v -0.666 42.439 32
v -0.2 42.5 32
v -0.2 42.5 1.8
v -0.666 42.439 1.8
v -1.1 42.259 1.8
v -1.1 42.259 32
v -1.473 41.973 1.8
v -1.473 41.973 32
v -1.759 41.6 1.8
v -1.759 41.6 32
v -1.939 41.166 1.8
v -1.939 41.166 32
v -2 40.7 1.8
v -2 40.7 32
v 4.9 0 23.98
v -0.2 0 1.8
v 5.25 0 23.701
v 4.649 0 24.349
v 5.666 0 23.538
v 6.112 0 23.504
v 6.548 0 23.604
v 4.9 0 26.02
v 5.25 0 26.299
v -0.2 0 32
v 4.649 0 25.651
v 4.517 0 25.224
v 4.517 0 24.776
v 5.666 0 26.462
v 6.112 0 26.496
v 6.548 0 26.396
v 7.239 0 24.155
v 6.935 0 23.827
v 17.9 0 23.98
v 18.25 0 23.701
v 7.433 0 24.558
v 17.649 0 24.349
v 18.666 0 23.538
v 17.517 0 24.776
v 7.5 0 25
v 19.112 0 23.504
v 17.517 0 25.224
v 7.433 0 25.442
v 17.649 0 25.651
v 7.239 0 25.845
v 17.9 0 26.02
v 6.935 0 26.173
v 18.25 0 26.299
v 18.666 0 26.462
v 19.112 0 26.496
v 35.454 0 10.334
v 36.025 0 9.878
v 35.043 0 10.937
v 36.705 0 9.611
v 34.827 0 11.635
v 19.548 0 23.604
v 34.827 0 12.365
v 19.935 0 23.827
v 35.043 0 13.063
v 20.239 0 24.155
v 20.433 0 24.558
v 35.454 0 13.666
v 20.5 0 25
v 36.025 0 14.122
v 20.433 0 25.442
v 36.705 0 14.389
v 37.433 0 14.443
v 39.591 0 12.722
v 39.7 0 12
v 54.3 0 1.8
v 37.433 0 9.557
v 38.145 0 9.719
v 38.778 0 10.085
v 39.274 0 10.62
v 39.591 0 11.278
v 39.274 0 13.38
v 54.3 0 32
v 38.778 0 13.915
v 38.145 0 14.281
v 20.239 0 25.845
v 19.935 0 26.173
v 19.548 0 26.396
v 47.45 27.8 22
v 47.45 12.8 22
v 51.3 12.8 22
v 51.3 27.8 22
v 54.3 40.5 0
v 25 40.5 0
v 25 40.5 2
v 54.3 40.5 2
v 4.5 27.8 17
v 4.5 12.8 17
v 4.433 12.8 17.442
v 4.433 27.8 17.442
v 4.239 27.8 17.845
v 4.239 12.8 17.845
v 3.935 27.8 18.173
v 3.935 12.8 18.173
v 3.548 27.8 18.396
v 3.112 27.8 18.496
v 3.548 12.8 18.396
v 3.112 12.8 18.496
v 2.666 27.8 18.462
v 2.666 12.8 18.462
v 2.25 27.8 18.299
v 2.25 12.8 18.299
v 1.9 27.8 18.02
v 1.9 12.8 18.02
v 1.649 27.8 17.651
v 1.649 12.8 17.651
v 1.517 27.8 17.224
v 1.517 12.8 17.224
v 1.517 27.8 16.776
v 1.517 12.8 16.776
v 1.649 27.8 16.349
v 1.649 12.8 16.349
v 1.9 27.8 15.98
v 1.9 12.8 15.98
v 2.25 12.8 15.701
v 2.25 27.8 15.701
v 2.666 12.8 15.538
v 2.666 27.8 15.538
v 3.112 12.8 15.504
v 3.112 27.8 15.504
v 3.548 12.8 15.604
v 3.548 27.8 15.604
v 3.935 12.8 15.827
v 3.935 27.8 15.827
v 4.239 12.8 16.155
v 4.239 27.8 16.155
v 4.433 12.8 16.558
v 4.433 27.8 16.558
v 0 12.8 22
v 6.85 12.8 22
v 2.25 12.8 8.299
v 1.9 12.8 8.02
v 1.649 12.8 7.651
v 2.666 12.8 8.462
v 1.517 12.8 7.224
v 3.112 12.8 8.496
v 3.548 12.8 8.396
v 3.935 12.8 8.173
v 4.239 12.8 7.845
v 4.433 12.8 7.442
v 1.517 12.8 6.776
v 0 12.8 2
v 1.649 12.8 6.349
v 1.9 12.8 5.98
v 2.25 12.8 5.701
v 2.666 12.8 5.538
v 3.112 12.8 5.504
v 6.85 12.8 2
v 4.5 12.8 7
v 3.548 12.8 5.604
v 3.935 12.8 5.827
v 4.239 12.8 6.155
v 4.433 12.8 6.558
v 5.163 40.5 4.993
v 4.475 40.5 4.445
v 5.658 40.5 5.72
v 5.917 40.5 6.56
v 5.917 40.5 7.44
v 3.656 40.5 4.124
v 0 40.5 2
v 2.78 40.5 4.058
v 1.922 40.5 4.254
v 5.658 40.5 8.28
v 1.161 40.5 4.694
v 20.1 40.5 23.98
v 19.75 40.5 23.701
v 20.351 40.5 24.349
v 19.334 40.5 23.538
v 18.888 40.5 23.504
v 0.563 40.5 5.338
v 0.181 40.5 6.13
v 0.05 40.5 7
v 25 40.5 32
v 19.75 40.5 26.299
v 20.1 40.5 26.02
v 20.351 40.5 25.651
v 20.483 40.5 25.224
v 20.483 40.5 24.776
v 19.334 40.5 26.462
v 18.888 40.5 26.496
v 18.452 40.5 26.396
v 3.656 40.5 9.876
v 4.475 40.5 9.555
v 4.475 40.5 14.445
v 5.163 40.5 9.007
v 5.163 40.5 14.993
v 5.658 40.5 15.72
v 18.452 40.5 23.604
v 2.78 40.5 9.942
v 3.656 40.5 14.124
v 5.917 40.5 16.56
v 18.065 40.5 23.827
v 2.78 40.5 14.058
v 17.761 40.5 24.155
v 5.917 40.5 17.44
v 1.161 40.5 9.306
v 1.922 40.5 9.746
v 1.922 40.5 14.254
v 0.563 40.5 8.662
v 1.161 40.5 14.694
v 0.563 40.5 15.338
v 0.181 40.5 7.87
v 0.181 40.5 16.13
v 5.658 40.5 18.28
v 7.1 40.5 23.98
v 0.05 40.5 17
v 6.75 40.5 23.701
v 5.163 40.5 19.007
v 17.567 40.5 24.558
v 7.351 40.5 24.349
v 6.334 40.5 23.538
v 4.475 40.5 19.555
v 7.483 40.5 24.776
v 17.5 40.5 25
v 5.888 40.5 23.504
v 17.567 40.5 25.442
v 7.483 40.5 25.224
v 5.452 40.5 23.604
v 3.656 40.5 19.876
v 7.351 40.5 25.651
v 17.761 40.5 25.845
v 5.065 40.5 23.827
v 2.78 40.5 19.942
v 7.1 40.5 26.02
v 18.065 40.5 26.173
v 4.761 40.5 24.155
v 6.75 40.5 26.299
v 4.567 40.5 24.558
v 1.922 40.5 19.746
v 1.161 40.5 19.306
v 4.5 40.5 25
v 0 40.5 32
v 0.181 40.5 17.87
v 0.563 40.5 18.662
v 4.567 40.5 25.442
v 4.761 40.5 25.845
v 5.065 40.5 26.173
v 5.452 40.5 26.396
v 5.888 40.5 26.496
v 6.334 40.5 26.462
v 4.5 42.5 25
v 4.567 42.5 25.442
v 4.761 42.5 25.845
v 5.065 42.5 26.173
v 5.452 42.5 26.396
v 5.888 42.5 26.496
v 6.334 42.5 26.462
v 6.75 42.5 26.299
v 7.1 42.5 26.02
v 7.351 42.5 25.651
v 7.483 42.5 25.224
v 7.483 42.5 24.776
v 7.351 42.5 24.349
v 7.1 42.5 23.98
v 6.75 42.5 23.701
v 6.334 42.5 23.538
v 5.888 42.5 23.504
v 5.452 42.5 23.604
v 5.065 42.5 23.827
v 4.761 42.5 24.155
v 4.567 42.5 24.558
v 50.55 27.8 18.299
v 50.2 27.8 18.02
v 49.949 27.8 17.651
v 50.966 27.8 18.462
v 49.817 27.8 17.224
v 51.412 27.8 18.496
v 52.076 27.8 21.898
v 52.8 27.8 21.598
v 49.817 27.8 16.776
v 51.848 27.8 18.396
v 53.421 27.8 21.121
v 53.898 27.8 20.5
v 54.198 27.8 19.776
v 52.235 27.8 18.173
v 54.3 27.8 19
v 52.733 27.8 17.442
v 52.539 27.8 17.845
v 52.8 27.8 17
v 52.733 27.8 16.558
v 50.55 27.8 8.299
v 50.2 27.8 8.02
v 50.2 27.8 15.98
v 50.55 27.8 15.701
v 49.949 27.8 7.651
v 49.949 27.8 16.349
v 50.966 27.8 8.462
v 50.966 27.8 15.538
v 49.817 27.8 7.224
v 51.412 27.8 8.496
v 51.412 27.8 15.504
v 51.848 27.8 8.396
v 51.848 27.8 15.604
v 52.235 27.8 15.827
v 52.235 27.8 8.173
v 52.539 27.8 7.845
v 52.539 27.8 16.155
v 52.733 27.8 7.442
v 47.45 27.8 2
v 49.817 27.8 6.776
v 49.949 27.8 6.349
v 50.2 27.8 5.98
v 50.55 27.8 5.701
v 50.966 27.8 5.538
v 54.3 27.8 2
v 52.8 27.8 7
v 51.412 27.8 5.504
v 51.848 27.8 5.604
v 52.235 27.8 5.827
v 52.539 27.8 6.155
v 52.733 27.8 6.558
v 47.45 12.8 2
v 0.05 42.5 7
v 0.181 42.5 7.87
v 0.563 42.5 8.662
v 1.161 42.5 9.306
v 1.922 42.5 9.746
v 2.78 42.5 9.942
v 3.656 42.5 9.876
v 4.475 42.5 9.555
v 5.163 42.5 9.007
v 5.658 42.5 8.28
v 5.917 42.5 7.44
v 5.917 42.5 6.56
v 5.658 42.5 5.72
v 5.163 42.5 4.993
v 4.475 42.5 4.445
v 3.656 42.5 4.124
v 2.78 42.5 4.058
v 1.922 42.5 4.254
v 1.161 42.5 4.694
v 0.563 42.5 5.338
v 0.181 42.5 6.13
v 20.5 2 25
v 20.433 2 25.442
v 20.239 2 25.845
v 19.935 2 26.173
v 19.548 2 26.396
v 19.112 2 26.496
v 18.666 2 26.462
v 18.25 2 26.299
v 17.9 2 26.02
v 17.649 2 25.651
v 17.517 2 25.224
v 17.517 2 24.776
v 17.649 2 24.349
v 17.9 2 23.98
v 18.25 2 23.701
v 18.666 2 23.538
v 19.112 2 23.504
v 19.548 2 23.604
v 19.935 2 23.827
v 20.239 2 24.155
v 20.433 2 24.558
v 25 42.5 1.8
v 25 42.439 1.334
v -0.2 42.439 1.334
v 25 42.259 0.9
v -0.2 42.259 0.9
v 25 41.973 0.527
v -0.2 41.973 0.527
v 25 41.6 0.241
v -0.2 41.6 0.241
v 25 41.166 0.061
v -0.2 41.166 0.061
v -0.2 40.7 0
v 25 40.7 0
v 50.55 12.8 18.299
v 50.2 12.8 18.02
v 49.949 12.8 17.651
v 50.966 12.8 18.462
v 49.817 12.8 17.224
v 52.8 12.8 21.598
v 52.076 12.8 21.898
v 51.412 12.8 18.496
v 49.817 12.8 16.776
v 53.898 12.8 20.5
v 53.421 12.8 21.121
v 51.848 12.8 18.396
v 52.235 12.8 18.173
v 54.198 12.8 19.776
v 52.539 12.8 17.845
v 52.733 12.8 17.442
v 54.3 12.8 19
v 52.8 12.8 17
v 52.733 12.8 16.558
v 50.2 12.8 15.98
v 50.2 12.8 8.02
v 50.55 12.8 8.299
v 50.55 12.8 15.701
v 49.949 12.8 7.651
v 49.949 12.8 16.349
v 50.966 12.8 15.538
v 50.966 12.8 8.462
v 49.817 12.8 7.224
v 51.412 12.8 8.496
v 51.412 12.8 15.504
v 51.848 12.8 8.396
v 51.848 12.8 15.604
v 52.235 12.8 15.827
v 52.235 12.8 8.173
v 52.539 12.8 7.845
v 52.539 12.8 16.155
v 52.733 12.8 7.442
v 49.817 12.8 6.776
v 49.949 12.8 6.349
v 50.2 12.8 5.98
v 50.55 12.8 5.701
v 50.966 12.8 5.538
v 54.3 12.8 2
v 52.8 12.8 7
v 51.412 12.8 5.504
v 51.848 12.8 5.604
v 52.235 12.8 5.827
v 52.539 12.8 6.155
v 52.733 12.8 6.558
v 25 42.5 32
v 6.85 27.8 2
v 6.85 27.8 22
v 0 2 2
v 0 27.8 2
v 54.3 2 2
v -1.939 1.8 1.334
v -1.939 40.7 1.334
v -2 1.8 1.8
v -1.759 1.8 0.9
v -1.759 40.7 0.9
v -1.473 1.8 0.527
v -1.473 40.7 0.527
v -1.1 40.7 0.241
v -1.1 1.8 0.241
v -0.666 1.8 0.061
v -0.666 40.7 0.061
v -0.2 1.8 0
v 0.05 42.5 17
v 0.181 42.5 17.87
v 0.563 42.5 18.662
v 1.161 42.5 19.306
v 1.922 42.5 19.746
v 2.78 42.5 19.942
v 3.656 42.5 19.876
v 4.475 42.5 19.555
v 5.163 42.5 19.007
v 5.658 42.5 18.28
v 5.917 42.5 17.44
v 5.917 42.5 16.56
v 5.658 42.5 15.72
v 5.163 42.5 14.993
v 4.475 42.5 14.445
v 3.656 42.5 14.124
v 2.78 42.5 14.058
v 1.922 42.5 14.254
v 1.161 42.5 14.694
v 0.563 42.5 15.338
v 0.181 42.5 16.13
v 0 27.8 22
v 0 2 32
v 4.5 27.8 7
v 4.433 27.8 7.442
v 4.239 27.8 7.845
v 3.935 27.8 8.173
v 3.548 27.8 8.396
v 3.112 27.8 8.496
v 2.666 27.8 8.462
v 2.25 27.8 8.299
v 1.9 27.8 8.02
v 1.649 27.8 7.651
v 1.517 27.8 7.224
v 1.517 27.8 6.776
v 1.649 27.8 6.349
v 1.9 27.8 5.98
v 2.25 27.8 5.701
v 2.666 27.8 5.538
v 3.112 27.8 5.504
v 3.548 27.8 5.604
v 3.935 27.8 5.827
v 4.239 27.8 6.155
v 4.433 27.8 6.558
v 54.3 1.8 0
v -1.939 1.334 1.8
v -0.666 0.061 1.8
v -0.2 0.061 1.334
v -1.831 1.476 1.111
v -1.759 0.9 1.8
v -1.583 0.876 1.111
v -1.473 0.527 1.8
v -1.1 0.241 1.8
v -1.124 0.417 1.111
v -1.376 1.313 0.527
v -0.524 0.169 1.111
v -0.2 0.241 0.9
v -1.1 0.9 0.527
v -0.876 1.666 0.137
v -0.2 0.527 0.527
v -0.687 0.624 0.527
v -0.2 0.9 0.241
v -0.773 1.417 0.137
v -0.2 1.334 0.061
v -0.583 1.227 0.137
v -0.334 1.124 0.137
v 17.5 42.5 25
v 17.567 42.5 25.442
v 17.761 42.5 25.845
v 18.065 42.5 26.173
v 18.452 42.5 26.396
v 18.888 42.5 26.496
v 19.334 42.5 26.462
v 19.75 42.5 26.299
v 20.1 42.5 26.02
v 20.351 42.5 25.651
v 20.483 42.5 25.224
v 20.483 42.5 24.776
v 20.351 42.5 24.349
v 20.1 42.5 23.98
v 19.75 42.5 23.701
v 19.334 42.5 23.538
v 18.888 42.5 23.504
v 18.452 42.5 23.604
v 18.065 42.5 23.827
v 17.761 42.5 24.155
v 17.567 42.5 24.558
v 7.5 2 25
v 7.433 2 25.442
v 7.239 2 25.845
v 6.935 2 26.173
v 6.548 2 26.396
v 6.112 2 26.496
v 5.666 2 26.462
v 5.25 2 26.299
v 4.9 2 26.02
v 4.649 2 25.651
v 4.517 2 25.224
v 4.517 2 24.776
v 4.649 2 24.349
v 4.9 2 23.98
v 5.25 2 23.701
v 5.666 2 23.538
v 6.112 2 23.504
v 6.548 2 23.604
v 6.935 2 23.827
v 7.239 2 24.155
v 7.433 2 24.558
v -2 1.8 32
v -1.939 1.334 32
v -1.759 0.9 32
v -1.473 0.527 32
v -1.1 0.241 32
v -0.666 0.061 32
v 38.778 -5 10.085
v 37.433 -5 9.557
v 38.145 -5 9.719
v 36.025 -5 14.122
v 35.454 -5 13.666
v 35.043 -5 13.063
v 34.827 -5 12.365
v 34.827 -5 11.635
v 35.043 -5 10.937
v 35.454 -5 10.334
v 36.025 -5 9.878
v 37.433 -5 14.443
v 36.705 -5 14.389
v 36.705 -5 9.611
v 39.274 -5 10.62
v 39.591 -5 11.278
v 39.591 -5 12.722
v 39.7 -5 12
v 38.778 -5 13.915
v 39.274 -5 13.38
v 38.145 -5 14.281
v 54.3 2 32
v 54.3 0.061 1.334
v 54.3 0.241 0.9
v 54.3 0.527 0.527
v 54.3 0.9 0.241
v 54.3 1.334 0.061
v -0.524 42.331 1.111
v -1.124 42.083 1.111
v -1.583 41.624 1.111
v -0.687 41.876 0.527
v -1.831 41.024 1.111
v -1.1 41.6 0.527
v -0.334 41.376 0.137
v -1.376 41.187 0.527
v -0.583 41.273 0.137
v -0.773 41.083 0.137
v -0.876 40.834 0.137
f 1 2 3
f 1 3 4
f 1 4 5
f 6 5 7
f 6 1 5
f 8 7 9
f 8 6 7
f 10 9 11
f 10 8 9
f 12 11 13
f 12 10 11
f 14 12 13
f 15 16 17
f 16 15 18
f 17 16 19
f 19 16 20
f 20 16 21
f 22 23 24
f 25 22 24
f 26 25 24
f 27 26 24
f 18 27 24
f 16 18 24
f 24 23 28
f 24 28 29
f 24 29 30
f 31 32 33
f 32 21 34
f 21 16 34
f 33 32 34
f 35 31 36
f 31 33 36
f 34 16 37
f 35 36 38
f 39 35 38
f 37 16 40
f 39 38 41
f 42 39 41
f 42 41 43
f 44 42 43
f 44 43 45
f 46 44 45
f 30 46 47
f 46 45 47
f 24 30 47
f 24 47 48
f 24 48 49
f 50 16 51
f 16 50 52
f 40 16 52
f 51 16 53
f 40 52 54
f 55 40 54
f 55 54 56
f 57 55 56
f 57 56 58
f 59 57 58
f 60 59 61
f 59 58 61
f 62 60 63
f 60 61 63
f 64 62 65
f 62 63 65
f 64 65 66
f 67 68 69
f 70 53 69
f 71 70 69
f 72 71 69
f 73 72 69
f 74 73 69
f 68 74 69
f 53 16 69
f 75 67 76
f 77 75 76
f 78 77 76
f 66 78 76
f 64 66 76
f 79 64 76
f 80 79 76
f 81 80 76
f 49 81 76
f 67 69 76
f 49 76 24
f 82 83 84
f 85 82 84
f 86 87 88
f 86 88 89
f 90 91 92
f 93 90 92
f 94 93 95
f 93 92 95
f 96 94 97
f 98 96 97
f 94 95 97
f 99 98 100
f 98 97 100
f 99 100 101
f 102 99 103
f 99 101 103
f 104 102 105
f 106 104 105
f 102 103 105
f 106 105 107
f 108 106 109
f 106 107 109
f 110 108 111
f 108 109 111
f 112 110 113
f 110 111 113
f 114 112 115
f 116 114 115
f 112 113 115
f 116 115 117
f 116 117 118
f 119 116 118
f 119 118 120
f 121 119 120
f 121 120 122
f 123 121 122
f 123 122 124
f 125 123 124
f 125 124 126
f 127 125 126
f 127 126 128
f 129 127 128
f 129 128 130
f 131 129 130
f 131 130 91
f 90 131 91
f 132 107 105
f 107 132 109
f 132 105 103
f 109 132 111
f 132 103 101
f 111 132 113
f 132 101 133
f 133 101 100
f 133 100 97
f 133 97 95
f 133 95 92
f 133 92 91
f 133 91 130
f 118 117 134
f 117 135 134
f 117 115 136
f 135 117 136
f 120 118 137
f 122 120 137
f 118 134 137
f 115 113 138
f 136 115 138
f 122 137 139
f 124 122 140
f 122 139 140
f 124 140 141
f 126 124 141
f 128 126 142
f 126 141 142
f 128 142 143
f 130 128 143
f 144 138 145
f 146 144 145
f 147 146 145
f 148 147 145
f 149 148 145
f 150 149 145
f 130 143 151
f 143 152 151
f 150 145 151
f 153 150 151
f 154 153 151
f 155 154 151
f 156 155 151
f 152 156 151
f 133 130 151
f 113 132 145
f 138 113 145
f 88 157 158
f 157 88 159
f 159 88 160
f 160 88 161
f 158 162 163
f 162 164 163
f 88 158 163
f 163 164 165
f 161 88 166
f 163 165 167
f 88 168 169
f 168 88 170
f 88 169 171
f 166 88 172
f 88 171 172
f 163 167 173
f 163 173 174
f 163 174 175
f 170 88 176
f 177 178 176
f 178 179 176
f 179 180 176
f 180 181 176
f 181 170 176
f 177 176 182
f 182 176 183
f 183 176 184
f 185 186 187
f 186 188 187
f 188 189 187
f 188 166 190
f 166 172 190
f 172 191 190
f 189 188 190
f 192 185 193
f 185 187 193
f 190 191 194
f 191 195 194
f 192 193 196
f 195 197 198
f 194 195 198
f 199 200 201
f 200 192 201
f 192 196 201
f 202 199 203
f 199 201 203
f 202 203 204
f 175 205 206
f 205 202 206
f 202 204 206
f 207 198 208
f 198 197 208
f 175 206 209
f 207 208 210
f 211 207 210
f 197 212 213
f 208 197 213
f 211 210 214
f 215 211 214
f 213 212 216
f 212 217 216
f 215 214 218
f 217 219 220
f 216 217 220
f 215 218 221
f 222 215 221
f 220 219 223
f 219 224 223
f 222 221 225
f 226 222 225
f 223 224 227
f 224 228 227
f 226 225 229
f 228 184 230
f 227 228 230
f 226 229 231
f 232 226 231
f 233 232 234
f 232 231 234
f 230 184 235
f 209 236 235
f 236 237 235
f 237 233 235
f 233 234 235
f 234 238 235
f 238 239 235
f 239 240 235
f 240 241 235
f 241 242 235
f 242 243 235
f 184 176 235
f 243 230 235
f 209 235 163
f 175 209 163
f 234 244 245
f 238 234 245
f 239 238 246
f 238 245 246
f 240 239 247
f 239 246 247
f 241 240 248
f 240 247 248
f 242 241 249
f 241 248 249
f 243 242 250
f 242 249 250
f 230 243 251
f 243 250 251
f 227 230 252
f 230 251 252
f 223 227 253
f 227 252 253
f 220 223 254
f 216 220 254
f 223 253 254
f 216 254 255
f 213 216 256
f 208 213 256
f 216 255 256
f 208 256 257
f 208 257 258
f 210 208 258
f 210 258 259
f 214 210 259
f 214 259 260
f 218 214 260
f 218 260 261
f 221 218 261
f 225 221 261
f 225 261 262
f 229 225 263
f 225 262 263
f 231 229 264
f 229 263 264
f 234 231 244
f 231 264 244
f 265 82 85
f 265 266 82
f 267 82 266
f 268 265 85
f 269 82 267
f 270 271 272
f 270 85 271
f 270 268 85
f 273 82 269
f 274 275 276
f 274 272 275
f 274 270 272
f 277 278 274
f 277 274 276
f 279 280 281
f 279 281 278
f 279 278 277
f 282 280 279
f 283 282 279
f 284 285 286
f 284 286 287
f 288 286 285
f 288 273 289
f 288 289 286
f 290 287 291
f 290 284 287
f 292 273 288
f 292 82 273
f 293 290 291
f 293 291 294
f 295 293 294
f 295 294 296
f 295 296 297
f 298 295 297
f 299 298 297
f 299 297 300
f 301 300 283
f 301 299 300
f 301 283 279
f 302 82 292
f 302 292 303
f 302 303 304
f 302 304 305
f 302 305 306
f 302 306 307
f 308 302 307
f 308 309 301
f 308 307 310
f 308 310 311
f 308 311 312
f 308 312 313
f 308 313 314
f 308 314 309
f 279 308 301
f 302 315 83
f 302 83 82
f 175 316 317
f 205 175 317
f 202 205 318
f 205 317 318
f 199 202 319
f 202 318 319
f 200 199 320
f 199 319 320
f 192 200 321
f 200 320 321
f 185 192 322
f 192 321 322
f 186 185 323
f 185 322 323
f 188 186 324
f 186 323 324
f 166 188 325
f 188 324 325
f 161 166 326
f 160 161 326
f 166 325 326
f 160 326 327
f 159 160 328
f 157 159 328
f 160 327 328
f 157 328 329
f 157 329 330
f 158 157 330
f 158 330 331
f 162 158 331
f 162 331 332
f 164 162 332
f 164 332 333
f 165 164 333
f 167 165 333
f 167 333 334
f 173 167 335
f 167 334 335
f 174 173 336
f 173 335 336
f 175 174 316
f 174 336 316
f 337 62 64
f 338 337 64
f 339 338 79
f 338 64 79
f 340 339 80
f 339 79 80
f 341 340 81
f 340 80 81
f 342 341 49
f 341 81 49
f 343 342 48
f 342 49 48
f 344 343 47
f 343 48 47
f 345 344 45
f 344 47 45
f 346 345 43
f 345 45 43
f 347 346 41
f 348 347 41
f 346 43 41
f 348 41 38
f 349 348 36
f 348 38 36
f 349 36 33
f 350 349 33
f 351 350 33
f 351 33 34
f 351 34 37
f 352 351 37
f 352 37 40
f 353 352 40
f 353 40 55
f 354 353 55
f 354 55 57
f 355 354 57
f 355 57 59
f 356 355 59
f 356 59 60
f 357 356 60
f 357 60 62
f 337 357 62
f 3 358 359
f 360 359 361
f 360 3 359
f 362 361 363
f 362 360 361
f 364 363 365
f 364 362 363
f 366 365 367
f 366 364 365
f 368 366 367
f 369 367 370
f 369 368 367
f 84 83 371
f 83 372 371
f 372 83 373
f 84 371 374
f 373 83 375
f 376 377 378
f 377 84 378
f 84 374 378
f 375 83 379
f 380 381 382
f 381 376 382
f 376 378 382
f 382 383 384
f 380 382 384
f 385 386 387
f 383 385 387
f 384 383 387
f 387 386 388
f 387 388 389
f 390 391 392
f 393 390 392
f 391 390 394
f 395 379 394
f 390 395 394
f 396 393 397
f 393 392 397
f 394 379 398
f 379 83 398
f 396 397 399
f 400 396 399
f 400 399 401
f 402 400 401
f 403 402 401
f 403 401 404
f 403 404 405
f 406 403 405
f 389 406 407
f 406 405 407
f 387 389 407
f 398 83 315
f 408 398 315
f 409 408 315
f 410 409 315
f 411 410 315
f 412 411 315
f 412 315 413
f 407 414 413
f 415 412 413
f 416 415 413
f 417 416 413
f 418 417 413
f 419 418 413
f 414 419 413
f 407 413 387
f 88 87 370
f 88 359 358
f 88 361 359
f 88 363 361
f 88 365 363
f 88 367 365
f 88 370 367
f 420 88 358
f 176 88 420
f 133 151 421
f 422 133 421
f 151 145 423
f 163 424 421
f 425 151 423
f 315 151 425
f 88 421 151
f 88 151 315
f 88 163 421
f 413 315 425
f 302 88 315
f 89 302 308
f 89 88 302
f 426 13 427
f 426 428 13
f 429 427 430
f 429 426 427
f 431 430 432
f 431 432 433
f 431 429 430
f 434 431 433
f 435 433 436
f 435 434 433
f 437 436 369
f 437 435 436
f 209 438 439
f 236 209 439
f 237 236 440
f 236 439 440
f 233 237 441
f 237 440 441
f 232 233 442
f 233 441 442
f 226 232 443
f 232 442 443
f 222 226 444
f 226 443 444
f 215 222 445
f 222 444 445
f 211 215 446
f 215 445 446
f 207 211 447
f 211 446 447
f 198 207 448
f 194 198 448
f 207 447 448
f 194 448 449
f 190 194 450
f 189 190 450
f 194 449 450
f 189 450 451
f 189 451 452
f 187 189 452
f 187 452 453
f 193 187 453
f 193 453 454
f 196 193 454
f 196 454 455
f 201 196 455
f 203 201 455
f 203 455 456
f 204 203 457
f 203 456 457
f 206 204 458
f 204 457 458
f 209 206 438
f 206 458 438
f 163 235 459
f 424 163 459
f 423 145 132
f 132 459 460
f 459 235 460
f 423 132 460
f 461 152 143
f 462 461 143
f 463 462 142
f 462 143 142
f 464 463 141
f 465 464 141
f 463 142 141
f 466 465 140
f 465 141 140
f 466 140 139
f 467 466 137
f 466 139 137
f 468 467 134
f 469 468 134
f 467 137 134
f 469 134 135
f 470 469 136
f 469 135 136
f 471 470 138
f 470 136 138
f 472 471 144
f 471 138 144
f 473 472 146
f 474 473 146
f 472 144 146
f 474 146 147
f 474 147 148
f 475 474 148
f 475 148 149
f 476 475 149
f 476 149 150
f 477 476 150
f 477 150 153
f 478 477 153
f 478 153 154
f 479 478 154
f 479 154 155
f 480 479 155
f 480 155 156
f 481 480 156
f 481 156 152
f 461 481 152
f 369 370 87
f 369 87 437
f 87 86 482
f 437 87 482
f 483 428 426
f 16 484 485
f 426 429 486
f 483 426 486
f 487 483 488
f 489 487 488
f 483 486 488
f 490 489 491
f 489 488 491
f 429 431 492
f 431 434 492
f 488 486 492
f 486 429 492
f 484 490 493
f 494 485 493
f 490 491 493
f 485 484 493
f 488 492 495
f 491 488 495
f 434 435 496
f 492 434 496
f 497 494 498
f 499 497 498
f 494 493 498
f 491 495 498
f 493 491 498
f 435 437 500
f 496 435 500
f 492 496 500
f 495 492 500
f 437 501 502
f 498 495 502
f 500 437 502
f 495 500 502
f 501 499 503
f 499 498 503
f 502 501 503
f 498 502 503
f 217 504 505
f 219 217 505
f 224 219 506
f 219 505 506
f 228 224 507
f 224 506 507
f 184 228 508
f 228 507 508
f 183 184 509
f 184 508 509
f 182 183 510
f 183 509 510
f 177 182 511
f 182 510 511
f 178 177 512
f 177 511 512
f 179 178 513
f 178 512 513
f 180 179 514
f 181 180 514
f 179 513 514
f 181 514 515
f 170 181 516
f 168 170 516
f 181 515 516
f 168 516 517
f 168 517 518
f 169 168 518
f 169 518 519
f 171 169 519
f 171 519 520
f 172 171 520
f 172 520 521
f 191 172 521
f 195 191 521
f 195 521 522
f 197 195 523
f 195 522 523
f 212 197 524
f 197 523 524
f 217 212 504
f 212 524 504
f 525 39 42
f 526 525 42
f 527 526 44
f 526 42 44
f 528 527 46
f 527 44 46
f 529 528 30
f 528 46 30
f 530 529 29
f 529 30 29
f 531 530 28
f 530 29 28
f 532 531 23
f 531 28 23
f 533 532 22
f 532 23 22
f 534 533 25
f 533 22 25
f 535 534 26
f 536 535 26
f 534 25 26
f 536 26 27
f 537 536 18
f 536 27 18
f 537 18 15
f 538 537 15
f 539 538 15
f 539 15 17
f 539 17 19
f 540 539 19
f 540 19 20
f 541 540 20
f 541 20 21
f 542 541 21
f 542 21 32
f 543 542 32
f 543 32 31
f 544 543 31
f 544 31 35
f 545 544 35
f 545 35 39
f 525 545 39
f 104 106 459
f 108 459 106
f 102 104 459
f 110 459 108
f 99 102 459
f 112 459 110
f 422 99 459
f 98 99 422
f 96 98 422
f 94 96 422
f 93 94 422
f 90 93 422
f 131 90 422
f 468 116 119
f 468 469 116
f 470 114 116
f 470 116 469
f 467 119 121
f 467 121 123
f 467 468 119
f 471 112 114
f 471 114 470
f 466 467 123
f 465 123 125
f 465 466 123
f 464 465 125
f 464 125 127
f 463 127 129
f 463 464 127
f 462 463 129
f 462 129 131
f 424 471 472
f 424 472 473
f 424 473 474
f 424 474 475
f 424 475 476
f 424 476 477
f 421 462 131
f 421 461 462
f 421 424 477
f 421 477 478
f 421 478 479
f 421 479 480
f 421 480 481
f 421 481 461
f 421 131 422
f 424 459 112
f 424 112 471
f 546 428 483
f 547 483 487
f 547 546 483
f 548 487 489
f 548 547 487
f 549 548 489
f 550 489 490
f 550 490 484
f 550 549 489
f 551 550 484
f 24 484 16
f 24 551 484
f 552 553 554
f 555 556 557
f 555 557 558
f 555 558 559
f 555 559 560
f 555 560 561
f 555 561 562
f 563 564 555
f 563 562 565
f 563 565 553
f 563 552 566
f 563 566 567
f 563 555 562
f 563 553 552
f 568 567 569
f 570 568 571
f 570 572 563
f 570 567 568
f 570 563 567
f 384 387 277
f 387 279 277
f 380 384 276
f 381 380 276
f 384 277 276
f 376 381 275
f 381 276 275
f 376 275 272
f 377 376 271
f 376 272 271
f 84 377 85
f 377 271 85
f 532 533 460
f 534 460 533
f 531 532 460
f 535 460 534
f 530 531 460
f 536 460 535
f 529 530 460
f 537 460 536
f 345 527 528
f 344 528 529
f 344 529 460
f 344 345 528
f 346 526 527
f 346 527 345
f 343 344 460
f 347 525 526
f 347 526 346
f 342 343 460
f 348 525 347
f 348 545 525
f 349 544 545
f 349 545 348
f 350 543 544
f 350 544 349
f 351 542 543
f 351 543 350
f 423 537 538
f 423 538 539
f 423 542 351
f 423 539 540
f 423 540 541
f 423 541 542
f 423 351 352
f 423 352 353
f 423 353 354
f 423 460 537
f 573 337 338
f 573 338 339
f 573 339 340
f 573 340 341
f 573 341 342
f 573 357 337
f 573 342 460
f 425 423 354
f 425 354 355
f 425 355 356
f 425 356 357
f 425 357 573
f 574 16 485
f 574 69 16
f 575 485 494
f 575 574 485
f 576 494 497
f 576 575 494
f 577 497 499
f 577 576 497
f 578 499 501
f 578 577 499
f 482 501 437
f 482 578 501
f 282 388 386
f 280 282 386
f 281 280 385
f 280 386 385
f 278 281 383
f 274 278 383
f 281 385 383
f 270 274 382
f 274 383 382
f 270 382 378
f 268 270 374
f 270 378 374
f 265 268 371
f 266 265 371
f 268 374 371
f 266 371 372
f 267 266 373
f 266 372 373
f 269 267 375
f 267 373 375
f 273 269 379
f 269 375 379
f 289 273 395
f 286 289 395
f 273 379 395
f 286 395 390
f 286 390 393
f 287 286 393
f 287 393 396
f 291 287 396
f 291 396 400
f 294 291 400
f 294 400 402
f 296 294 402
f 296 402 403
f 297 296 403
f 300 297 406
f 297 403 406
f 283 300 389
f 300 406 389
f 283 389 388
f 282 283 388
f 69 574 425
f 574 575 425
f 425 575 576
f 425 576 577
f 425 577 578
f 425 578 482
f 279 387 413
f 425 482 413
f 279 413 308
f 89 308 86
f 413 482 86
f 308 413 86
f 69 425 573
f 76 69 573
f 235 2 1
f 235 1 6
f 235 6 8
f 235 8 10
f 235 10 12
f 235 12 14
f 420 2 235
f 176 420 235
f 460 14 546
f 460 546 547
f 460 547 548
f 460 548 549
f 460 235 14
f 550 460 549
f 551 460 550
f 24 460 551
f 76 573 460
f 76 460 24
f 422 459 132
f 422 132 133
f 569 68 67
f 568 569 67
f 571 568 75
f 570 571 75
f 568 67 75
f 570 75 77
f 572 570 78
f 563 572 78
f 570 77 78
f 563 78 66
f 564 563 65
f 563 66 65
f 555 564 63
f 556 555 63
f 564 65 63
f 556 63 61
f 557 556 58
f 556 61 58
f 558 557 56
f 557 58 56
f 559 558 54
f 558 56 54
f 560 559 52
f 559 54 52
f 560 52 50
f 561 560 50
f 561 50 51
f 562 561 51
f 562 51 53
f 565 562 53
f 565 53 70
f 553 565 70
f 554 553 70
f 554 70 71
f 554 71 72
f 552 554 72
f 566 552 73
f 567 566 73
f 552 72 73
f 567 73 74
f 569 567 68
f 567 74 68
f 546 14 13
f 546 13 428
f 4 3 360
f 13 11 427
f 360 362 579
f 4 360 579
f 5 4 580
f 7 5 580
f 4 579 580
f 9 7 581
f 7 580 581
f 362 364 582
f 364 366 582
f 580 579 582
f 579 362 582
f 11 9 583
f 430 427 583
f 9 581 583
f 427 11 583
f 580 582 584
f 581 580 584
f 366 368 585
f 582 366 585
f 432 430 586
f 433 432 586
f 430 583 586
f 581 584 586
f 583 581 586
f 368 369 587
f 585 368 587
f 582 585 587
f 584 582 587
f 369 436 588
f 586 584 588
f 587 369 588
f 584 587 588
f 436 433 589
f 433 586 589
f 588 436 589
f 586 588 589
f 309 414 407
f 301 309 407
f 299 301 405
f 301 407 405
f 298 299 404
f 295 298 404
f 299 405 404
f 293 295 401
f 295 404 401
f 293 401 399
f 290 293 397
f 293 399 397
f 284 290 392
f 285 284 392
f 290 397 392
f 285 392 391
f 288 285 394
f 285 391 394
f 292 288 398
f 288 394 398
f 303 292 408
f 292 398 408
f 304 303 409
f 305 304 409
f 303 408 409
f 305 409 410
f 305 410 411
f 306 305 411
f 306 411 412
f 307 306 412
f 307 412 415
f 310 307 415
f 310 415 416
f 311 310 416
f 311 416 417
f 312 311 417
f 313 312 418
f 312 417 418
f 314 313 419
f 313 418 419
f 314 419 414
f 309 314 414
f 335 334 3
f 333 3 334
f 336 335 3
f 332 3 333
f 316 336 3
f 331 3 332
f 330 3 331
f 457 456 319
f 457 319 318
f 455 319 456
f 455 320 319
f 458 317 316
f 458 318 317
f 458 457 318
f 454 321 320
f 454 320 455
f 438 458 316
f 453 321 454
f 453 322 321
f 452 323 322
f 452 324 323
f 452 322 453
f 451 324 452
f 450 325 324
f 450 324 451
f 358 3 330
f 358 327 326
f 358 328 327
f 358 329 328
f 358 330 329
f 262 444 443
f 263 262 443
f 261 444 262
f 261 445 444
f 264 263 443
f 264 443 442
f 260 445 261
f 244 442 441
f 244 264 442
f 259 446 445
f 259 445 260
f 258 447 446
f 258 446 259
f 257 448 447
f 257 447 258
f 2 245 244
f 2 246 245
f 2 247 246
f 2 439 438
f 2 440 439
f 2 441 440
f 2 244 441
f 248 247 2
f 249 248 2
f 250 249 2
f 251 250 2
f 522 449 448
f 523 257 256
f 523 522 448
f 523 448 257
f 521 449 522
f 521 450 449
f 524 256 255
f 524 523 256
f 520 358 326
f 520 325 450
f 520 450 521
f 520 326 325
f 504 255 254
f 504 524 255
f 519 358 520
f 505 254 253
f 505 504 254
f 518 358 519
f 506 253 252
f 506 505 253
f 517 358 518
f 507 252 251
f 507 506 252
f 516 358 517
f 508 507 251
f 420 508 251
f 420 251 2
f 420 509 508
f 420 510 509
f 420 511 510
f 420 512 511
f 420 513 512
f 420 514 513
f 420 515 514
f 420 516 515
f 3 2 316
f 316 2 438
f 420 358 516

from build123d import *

# Parameters (mm, degrees)
SKETCH_W        = 54.3
SKETCH_H        = 38.5
PAD_DEPTH       = 2
SKETCH003_W     = 6.85
SKETCH003_H     = 15
PAD001_DEPTH    = 20
SKETCH001_W     = 54.3
SKETCH001_H     = 2
PAD003_DEPTH    = 32
SKETCH005_W     = 6.85
SKETCH005_H     = 15
PAD004_DEPTH    = 20
SKETCH002_R     = 2.45
PAD005_DEPTH    = 5
SKETCH007_W     = 25
SKETCH007_H     = 32
PAD006_DEPTH    = 2
SKETCH006_R     = 1.5
POCKET_DEPTH    = 15
SKETCH004_R     = 1.5
POCKET001_DEPTH = 20
SKETCH009_R     = 1.5
SKETCH009_R_2   = 2.95
POCKET002_DEPTH = 2
SKETCH008_R     = 1.5
POCKET003_DEPTH = 3
SKETCH010_W     = 42.5
SKETCH010_H     = 32
PAD007_DEPTH    = 2
FILLET_R        = 1.8
FILLET001_R     = 1.8
FILLET002_R     = 1.8
FILLET003_R     = 3


with BuildPart() as part:
    # Sketch → Pad (new body)
    with BuildSketch(Plane.XY):
        with Locations((27.15, 21.25)):
            Rectangle(SKETCH_W, SKETCH_H)
    extrude(amount=PAD_DEPTH)

    # Sketch003 → Pad001 (join)
    with BuildSketch(Plane.XY.offset(2)):
        with Locations((3.425, 20.3)):
            Rectangle(SKETCH003_W, SKETCH003_H)
    extrude(amount=PAD001_DEPTH)

    # Sketch001 → Pad003 (join)
    with BuildSketch(Plane.XY):
        with Locations((27.15, 1)):
            Rectangle(SKETCH001_W, SKETCH001_H)
    extrude(amount=PAD003_DEPTH)

    # Sketch005 (on Face5 of Pad003) → Pad004 (join)
    with BuildSketch(Plane.XY.offset(2)):
        with Locations((50.875, 20.3)):
            Rectangle(SKETCH005_W, SKETCH005_H)
    extrude(amount=PAD004_DEPTH)

    # Sketch002 (on Face18 of Pad004) → Pad005 (join)
    with BuildSketch(Plane.XZ):
        with Locations((37.25, 12)):
            Circle(SKETCH002_R)
    extrude(amount=PAD005_DEPTH)

    # Sketch007 (on Face1 of Pad005) → Pad006 (join)
    with BuildSketch(Plane(origin=(0, 40.5, 0), x_dir=(-1, 0, 0), z_dir=(0, 1, 0))):
        with Locations((-12.5, 16)):
            Rectangle(SKETCH007_W, SKETCH007_H)
    extrude(amount=PAD006_DEPTH)

    # Sketch006 (on Face14 of Pad006) → Pocket (cut)
    with BuildSketch(Plane.XZ.offset(-12.8)):
        with Locations((51.3, 17)):
            Circle(SKETCH006_R)
        with Locations((51.3, 7)):
            Circle(SKETCH006_R)
    extrude(amount=-POCKET_DEPTH, mode=Mode.SUBTRACT)

    # Sketch004 (on Face16 of Pocket) → Pocket001 (cut)
    with BuildSketch(Plane.XZ.offset(-12.8)):
        with Locations((3, 17)):
            Circle(SKETCH004_R)
        with Locations((3, 7)):
            Circle(SKETCH004_R)
    extrude(amount=-POCKET001_DEPTH, mode=Mode.SUBTRACT)

    # Sketch009 (on Face20 of Pocket001) → Pocket002 (cut)
    with BuildSketch(Plane(origin=(0, 42.5, 0), x_dir=(-1, 0, 0), z_dir=(0, 1, 0))):
        with Locations((-6, 25)):
            Circle(SKETCH009_R)
        with Locations((-19, 25)):
            Circle(SKETCH009_R)
        with Locations((-3, 7)):
            Circle(SKETCH009_R_2)
        with Locations((-3, 17)):
            Circle(SKETCH009_R_2)
    extrude(amount=-POCKET002_DEPTH, mode=Mode.SUBTRACT)

    # Sketch008 → Pocket003 (cut)
    with BuildSketch(Plane.XZ):
        with Locations((19, 25)):
            Circle(SKETCH008_R)
        with Locations((6, 25)):
            Circle(SKETCH008_R)
    extrude(amount=-POCKET003_DEPTH, mode=Mode.SUBTRACT)

    # Sketch010 (on Face8 of Pocket003) → Pad007 (join)
    with BuildSketch(Plane(origin=(0, 0, 0), x_dir=(0, -1, 0), z_dir=(-1, 0, 0))):
        with Locations((-21.25, 16)):
            Rectangle(SKETCH010_W, SKETCH010_H)
    extrude(amount=PAD007_DEPTH)

    # Fillet
    fillet_edges = [part.edges().sort_by_distance(p)[0] for p in [
        (-2, 42.5, 16),
    ]]
    fillet(fillet_edges, radius=FILLET_R)

    # Fillet001
    fillet001_edges = [part.edges().sort_by_distance(p)[0] for p in [
        (-2, 0, 16),
    ]]
    fillet(fillet001_edges, radius=FILLET001_R)

    # Fillet002
    fillet002_edges = [part.edges().sort_by_distance(p)[0] for p in [
        (-2, 21.25, 0),
    ]]
    fillet(fillet002_edges, radius=FILLET002_R)

    # Fillet003
    fillet003_edges = [part.edges().sort_by_distance(p)[0] for p in [
        (54.3, 20.3, 22),
    ]]
    fillet(fillet003_edges, radius=FILLET003_R)


solid = part.part
